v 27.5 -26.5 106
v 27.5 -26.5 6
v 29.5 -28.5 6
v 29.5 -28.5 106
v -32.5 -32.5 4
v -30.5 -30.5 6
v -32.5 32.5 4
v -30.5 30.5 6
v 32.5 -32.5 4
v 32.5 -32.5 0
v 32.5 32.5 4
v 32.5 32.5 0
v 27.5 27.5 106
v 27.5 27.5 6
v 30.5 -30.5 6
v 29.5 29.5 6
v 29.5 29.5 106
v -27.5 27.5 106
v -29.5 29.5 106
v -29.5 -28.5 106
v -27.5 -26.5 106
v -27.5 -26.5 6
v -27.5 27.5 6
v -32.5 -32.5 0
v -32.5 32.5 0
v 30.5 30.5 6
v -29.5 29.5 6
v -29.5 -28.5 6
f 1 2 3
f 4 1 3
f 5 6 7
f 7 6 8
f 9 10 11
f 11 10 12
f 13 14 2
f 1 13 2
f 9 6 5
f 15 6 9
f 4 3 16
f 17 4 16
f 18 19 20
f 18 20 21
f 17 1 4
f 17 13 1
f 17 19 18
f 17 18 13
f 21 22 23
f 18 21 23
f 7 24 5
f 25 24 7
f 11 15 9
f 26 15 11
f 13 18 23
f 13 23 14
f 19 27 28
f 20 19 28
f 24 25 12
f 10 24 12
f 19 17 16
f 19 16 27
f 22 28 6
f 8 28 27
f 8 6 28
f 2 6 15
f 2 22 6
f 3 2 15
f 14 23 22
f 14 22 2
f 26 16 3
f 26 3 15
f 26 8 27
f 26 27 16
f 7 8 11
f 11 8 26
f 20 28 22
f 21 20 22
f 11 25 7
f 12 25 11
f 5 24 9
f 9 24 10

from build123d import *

# Parameters (mm, degrees)
F0_W     = 65
F0_H     = 65
F1_DEPTH = 6
F2_SIZE  = 2
F4_DEPTH = 100


with BuildPart() as f1:
    # F0 (on Top) → F1 (new body)
    with BuildSketch(Plane.XY):
        Rectangle(F0_W, F0_H)
    extrude(amount=F1_DEPTH)

    # F2
    f2_edges = [f1.edges().sort_by_distance(p)[0] for p in [
        (0, -32.5, 6),
        (32.5, 0, 6),
        (0, 32.5, 6),
        (-32.5, 0, 6),
    ]]
    chamfer(f2_edges, length=F2_SIZE)

    # F3 (on face) → F4 (join)
    with BuildSketch(Plane.XY.offset(6)):
        Polygon((27.5, -26.5), (29.5, -28.5), (29.5, 29.5), (-29.5, 29.5), (-29.5, -28.5), (-27.5, -26.5), (-27.5, 27.5), (27.5, 27.5), align=None)
    extrude(amount=F4_DEPTH)


solid = f1.part
